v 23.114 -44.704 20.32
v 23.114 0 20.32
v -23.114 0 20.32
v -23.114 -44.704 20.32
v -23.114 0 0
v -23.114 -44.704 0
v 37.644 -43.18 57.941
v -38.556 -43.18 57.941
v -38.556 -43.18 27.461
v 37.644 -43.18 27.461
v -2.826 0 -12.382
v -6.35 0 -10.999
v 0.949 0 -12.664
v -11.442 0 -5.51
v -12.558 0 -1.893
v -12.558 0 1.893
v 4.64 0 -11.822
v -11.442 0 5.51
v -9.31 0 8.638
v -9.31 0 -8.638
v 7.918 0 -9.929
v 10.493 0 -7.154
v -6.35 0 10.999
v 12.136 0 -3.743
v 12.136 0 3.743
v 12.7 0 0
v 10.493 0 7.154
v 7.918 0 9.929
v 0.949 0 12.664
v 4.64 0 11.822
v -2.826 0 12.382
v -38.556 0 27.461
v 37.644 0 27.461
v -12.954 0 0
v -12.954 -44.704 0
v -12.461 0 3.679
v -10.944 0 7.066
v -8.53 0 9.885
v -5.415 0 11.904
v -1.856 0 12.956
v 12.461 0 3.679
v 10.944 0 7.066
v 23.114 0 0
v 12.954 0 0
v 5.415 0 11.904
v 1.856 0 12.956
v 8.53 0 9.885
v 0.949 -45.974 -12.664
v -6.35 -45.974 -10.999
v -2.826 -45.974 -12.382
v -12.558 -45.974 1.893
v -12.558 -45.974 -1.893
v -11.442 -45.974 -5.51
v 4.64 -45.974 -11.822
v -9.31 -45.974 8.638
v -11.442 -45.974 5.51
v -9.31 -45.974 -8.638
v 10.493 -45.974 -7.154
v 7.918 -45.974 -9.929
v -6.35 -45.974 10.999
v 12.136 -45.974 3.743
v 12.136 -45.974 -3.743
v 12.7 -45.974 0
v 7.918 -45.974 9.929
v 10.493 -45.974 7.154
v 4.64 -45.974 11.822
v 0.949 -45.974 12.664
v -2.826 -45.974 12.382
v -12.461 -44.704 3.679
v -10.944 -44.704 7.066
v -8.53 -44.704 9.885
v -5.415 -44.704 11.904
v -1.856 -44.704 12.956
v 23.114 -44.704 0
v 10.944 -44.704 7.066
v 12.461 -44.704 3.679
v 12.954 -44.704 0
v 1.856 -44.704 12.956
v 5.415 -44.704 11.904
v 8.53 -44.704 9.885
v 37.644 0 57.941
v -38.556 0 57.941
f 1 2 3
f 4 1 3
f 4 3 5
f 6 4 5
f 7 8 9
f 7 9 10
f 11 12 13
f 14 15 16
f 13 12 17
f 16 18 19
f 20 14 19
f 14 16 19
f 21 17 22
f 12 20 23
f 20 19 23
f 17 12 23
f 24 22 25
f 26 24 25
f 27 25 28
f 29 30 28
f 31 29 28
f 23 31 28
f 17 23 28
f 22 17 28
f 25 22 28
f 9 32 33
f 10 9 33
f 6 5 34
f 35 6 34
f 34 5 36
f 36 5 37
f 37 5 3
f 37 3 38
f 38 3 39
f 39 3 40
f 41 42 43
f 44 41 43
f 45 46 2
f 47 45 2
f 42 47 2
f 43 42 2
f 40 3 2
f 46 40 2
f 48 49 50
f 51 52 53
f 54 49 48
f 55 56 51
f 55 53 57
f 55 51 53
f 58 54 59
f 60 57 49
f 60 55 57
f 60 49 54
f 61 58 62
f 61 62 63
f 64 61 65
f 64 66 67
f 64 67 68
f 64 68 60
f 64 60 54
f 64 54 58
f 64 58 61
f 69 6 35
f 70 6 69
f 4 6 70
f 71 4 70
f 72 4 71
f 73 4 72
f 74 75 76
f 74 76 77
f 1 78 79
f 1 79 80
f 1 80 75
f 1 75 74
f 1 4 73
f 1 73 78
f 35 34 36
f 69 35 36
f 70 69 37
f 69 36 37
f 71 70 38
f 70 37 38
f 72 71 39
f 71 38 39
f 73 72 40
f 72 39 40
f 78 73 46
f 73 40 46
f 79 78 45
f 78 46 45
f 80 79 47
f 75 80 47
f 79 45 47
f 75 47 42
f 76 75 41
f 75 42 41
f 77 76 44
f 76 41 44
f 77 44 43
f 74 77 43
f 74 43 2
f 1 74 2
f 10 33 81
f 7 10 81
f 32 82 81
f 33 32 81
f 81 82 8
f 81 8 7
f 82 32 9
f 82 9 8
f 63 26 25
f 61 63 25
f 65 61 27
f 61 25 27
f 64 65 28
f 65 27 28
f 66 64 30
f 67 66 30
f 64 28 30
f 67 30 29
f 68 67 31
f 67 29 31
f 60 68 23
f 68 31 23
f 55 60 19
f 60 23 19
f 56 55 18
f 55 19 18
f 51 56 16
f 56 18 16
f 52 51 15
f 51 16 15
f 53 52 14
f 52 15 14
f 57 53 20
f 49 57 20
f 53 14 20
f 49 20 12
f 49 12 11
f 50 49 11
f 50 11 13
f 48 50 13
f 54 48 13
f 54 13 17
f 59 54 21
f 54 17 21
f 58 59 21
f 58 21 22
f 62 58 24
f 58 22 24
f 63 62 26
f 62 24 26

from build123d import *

# Parameters (mm, degrees)
F0_R     = 12.7
F1_DEPTH = 45.974
F3_DEPTH = 44.704
F4_W     = 76.2
F4_H     = 30.48
F5_DEPTH = 43.18


with BuildPart() as f1:
    # F0 (on Front) → F1 (new body)
    with BuildSketch(Plane.XZ):
        Circle(F0_R)
    extrude(amount=F1_DEPTH)


with BuildPart() as f3:
    # F2 (on Front) → F3 (new body)
    with BuildSketch(Plane.XZ):
        with BuildLine():
            ThreePointArc((-12.954, 0), (0, 13.08981), (12.954, 0))
            Line((12.954, 0), (23.114, 0))
            Line((23.114, 0), (23.114, 20.32))
            Line((23.114, 20.32), (-23.114, 20.32))
            Line((-23.114, 20.32), (-23.114, 0))
            Line((-23.114, 0), (-12.954, 0))
        make_face()
    extrude(amount=F3_DEPTH)


with BuildPart() as f5:
    # F4 (on Front) → F5 (new body)
    with BuildSketch(Plane.XZ):
        with Locations((-0.456051, 42.700759)):
            Rectangle(F4_W, F4_H)
    extrude(amount=F5_DEPTH)

    # F6: cut F1, F3
    add(f1.part, mode=Mode.SUBTRACT)
    add(f3.part, mode=Mode.SUBTRACT)


solid = Compound([f1.part, f3.part, f5.part])
